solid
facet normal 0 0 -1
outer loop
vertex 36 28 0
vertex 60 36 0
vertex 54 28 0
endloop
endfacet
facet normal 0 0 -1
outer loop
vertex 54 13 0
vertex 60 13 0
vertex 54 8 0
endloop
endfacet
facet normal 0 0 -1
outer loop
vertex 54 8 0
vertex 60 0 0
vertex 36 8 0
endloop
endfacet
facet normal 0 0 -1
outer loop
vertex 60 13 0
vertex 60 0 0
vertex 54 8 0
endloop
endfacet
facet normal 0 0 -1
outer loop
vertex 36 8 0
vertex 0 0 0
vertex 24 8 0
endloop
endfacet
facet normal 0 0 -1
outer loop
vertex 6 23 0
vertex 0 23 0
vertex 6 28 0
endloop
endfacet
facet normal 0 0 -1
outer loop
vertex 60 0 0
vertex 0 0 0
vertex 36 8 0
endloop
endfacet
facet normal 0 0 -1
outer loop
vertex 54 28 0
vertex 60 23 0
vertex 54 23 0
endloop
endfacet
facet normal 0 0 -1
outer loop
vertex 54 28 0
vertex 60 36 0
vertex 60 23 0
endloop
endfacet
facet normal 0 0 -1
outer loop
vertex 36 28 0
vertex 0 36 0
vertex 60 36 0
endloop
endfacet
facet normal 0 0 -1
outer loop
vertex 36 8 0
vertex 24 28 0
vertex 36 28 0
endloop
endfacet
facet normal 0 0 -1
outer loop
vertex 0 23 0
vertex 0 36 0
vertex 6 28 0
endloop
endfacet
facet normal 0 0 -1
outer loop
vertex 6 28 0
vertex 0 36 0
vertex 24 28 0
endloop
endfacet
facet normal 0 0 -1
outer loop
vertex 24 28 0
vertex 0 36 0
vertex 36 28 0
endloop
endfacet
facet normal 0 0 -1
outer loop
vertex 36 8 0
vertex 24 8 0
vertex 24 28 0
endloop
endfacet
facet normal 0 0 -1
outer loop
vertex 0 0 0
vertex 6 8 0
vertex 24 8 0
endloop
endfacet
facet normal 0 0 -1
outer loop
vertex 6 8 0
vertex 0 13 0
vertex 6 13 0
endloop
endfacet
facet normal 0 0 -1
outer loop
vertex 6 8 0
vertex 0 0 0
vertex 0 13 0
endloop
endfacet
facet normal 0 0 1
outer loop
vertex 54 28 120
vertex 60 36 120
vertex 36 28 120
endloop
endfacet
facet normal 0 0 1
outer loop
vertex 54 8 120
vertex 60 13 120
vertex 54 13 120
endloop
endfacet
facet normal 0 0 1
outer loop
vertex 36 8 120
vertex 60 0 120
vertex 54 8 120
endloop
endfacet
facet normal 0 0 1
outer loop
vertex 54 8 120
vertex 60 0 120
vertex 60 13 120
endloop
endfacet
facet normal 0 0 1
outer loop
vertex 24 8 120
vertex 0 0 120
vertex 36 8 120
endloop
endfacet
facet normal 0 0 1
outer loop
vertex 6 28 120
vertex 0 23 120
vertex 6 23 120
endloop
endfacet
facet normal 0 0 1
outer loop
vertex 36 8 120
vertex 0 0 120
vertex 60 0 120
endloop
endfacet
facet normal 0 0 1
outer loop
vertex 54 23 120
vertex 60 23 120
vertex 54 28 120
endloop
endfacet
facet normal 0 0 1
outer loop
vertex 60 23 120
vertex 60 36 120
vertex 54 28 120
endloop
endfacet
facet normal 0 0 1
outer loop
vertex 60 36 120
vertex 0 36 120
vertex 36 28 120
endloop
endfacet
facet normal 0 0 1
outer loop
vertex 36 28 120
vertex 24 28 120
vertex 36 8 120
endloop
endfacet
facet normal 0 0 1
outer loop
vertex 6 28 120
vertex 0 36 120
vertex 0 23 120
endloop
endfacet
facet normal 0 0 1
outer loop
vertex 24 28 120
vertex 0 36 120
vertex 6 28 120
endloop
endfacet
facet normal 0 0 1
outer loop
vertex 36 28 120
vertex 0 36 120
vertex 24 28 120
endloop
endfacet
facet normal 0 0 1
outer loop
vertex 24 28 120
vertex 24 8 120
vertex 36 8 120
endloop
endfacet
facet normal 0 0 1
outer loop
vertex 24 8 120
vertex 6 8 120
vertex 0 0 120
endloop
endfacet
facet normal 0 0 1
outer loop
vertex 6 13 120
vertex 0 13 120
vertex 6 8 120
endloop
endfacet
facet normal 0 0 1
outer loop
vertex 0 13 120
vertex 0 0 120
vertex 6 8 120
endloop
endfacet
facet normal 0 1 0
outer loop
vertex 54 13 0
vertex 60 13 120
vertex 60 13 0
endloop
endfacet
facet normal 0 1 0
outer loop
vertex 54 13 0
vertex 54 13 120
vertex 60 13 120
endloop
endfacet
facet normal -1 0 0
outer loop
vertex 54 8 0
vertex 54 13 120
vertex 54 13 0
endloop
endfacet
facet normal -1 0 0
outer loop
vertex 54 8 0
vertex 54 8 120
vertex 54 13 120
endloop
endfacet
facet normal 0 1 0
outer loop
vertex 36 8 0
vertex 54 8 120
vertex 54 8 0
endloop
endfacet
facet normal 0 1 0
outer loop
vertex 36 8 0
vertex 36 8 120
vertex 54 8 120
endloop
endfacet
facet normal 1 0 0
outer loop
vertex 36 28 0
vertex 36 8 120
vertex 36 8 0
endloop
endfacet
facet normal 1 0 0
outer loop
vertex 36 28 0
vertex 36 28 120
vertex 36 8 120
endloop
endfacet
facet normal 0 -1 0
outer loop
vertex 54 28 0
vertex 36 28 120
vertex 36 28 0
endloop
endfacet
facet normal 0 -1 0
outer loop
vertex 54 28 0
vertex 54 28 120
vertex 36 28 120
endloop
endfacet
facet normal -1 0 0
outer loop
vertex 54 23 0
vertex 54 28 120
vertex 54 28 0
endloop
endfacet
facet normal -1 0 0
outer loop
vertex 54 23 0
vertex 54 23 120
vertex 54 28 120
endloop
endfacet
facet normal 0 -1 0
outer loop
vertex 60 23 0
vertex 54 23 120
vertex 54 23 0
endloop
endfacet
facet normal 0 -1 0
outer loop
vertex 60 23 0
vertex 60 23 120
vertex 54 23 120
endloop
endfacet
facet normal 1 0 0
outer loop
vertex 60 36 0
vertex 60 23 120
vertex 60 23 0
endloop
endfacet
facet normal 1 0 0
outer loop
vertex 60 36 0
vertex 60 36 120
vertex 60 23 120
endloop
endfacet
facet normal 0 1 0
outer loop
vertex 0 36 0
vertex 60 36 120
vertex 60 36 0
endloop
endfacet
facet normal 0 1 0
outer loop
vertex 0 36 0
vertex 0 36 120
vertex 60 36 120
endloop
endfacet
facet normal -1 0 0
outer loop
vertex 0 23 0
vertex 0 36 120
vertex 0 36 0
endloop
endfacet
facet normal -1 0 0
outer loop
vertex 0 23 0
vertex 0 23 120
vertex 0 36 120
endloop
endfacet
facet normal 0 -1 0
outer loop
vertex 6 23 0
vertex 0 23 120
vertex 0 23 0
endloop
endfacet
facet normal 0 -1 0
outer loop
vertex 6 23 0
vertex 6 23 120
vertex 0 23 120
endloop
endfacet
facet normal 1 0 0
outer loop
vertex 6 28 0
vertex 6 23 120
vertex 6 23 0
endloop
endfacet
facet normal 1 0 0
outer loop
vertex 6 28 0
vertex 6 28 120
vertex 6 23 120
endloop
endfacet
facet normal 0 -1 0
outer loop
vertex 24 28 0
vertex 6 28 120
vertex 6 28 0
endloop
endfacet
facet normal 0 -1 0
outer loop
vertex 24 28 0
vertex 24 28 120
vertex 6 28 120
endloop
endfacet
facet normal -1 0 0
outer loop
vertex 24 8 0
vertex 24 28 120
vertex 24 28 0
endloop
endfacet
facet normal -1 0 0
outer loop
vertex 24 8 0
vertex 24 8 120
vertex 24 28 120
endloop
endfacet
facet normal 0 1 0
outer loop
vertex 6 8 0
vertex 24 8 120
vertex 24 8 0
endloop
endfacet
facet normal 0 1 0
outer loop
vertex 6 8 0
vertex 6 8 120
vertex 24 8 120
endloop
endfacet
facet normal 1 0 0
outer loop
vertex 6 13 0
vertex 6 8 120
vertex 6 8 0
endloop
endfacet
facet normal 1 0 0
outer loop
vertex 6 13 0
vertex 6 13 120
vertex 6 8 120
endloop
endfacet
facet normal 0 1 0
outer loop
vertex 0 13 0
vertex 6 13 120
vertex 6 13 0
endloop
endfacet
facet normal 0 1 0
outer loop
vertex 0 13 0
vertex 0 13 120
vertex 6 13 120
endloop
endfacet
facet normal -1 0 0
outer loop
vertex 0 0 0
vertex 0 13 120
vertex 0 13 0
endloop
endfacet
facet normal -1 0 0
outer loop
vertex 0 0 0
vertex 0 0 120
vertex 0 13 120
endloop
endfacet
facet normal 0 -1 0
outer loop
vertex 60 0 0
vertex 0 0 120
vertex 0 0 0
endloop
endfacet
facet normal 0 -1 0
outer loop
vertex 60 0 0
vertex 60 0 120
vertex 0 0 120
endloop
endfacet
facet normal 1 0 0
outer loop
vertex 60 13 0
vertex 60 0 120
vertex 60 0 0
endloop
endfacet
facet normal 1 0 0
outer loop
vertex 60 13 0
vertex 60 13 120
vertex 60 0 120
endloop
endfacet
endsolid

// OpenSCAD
$fn = 32;

// ----------------------------------------------------------------------
// T-slot rail: 60 x 36 mm section, 120 mm long
// ----------------------------------------------------------------------

// --- parameters (mm) ---
profile_height = 120;     // extrusion height
profile_points = 20;      // points of the closed outline

profile = [[0, 0], [60, 0], [60, 13], [54, 13], [54, 8], [36, 8], [36, 28], [54, 28], [54, 23], [60, 23], [60, 36], [0, 36], [0, 23], [6, 23], [6, 28], [24, 28], [24, 8], [6, 8], [6, 13], [0, 13]];  // single closed polygon, 20 points, counter clockwise

// --- the one profile operation ---
linear_extrude(height = profile_height) polygon(points = profile);
